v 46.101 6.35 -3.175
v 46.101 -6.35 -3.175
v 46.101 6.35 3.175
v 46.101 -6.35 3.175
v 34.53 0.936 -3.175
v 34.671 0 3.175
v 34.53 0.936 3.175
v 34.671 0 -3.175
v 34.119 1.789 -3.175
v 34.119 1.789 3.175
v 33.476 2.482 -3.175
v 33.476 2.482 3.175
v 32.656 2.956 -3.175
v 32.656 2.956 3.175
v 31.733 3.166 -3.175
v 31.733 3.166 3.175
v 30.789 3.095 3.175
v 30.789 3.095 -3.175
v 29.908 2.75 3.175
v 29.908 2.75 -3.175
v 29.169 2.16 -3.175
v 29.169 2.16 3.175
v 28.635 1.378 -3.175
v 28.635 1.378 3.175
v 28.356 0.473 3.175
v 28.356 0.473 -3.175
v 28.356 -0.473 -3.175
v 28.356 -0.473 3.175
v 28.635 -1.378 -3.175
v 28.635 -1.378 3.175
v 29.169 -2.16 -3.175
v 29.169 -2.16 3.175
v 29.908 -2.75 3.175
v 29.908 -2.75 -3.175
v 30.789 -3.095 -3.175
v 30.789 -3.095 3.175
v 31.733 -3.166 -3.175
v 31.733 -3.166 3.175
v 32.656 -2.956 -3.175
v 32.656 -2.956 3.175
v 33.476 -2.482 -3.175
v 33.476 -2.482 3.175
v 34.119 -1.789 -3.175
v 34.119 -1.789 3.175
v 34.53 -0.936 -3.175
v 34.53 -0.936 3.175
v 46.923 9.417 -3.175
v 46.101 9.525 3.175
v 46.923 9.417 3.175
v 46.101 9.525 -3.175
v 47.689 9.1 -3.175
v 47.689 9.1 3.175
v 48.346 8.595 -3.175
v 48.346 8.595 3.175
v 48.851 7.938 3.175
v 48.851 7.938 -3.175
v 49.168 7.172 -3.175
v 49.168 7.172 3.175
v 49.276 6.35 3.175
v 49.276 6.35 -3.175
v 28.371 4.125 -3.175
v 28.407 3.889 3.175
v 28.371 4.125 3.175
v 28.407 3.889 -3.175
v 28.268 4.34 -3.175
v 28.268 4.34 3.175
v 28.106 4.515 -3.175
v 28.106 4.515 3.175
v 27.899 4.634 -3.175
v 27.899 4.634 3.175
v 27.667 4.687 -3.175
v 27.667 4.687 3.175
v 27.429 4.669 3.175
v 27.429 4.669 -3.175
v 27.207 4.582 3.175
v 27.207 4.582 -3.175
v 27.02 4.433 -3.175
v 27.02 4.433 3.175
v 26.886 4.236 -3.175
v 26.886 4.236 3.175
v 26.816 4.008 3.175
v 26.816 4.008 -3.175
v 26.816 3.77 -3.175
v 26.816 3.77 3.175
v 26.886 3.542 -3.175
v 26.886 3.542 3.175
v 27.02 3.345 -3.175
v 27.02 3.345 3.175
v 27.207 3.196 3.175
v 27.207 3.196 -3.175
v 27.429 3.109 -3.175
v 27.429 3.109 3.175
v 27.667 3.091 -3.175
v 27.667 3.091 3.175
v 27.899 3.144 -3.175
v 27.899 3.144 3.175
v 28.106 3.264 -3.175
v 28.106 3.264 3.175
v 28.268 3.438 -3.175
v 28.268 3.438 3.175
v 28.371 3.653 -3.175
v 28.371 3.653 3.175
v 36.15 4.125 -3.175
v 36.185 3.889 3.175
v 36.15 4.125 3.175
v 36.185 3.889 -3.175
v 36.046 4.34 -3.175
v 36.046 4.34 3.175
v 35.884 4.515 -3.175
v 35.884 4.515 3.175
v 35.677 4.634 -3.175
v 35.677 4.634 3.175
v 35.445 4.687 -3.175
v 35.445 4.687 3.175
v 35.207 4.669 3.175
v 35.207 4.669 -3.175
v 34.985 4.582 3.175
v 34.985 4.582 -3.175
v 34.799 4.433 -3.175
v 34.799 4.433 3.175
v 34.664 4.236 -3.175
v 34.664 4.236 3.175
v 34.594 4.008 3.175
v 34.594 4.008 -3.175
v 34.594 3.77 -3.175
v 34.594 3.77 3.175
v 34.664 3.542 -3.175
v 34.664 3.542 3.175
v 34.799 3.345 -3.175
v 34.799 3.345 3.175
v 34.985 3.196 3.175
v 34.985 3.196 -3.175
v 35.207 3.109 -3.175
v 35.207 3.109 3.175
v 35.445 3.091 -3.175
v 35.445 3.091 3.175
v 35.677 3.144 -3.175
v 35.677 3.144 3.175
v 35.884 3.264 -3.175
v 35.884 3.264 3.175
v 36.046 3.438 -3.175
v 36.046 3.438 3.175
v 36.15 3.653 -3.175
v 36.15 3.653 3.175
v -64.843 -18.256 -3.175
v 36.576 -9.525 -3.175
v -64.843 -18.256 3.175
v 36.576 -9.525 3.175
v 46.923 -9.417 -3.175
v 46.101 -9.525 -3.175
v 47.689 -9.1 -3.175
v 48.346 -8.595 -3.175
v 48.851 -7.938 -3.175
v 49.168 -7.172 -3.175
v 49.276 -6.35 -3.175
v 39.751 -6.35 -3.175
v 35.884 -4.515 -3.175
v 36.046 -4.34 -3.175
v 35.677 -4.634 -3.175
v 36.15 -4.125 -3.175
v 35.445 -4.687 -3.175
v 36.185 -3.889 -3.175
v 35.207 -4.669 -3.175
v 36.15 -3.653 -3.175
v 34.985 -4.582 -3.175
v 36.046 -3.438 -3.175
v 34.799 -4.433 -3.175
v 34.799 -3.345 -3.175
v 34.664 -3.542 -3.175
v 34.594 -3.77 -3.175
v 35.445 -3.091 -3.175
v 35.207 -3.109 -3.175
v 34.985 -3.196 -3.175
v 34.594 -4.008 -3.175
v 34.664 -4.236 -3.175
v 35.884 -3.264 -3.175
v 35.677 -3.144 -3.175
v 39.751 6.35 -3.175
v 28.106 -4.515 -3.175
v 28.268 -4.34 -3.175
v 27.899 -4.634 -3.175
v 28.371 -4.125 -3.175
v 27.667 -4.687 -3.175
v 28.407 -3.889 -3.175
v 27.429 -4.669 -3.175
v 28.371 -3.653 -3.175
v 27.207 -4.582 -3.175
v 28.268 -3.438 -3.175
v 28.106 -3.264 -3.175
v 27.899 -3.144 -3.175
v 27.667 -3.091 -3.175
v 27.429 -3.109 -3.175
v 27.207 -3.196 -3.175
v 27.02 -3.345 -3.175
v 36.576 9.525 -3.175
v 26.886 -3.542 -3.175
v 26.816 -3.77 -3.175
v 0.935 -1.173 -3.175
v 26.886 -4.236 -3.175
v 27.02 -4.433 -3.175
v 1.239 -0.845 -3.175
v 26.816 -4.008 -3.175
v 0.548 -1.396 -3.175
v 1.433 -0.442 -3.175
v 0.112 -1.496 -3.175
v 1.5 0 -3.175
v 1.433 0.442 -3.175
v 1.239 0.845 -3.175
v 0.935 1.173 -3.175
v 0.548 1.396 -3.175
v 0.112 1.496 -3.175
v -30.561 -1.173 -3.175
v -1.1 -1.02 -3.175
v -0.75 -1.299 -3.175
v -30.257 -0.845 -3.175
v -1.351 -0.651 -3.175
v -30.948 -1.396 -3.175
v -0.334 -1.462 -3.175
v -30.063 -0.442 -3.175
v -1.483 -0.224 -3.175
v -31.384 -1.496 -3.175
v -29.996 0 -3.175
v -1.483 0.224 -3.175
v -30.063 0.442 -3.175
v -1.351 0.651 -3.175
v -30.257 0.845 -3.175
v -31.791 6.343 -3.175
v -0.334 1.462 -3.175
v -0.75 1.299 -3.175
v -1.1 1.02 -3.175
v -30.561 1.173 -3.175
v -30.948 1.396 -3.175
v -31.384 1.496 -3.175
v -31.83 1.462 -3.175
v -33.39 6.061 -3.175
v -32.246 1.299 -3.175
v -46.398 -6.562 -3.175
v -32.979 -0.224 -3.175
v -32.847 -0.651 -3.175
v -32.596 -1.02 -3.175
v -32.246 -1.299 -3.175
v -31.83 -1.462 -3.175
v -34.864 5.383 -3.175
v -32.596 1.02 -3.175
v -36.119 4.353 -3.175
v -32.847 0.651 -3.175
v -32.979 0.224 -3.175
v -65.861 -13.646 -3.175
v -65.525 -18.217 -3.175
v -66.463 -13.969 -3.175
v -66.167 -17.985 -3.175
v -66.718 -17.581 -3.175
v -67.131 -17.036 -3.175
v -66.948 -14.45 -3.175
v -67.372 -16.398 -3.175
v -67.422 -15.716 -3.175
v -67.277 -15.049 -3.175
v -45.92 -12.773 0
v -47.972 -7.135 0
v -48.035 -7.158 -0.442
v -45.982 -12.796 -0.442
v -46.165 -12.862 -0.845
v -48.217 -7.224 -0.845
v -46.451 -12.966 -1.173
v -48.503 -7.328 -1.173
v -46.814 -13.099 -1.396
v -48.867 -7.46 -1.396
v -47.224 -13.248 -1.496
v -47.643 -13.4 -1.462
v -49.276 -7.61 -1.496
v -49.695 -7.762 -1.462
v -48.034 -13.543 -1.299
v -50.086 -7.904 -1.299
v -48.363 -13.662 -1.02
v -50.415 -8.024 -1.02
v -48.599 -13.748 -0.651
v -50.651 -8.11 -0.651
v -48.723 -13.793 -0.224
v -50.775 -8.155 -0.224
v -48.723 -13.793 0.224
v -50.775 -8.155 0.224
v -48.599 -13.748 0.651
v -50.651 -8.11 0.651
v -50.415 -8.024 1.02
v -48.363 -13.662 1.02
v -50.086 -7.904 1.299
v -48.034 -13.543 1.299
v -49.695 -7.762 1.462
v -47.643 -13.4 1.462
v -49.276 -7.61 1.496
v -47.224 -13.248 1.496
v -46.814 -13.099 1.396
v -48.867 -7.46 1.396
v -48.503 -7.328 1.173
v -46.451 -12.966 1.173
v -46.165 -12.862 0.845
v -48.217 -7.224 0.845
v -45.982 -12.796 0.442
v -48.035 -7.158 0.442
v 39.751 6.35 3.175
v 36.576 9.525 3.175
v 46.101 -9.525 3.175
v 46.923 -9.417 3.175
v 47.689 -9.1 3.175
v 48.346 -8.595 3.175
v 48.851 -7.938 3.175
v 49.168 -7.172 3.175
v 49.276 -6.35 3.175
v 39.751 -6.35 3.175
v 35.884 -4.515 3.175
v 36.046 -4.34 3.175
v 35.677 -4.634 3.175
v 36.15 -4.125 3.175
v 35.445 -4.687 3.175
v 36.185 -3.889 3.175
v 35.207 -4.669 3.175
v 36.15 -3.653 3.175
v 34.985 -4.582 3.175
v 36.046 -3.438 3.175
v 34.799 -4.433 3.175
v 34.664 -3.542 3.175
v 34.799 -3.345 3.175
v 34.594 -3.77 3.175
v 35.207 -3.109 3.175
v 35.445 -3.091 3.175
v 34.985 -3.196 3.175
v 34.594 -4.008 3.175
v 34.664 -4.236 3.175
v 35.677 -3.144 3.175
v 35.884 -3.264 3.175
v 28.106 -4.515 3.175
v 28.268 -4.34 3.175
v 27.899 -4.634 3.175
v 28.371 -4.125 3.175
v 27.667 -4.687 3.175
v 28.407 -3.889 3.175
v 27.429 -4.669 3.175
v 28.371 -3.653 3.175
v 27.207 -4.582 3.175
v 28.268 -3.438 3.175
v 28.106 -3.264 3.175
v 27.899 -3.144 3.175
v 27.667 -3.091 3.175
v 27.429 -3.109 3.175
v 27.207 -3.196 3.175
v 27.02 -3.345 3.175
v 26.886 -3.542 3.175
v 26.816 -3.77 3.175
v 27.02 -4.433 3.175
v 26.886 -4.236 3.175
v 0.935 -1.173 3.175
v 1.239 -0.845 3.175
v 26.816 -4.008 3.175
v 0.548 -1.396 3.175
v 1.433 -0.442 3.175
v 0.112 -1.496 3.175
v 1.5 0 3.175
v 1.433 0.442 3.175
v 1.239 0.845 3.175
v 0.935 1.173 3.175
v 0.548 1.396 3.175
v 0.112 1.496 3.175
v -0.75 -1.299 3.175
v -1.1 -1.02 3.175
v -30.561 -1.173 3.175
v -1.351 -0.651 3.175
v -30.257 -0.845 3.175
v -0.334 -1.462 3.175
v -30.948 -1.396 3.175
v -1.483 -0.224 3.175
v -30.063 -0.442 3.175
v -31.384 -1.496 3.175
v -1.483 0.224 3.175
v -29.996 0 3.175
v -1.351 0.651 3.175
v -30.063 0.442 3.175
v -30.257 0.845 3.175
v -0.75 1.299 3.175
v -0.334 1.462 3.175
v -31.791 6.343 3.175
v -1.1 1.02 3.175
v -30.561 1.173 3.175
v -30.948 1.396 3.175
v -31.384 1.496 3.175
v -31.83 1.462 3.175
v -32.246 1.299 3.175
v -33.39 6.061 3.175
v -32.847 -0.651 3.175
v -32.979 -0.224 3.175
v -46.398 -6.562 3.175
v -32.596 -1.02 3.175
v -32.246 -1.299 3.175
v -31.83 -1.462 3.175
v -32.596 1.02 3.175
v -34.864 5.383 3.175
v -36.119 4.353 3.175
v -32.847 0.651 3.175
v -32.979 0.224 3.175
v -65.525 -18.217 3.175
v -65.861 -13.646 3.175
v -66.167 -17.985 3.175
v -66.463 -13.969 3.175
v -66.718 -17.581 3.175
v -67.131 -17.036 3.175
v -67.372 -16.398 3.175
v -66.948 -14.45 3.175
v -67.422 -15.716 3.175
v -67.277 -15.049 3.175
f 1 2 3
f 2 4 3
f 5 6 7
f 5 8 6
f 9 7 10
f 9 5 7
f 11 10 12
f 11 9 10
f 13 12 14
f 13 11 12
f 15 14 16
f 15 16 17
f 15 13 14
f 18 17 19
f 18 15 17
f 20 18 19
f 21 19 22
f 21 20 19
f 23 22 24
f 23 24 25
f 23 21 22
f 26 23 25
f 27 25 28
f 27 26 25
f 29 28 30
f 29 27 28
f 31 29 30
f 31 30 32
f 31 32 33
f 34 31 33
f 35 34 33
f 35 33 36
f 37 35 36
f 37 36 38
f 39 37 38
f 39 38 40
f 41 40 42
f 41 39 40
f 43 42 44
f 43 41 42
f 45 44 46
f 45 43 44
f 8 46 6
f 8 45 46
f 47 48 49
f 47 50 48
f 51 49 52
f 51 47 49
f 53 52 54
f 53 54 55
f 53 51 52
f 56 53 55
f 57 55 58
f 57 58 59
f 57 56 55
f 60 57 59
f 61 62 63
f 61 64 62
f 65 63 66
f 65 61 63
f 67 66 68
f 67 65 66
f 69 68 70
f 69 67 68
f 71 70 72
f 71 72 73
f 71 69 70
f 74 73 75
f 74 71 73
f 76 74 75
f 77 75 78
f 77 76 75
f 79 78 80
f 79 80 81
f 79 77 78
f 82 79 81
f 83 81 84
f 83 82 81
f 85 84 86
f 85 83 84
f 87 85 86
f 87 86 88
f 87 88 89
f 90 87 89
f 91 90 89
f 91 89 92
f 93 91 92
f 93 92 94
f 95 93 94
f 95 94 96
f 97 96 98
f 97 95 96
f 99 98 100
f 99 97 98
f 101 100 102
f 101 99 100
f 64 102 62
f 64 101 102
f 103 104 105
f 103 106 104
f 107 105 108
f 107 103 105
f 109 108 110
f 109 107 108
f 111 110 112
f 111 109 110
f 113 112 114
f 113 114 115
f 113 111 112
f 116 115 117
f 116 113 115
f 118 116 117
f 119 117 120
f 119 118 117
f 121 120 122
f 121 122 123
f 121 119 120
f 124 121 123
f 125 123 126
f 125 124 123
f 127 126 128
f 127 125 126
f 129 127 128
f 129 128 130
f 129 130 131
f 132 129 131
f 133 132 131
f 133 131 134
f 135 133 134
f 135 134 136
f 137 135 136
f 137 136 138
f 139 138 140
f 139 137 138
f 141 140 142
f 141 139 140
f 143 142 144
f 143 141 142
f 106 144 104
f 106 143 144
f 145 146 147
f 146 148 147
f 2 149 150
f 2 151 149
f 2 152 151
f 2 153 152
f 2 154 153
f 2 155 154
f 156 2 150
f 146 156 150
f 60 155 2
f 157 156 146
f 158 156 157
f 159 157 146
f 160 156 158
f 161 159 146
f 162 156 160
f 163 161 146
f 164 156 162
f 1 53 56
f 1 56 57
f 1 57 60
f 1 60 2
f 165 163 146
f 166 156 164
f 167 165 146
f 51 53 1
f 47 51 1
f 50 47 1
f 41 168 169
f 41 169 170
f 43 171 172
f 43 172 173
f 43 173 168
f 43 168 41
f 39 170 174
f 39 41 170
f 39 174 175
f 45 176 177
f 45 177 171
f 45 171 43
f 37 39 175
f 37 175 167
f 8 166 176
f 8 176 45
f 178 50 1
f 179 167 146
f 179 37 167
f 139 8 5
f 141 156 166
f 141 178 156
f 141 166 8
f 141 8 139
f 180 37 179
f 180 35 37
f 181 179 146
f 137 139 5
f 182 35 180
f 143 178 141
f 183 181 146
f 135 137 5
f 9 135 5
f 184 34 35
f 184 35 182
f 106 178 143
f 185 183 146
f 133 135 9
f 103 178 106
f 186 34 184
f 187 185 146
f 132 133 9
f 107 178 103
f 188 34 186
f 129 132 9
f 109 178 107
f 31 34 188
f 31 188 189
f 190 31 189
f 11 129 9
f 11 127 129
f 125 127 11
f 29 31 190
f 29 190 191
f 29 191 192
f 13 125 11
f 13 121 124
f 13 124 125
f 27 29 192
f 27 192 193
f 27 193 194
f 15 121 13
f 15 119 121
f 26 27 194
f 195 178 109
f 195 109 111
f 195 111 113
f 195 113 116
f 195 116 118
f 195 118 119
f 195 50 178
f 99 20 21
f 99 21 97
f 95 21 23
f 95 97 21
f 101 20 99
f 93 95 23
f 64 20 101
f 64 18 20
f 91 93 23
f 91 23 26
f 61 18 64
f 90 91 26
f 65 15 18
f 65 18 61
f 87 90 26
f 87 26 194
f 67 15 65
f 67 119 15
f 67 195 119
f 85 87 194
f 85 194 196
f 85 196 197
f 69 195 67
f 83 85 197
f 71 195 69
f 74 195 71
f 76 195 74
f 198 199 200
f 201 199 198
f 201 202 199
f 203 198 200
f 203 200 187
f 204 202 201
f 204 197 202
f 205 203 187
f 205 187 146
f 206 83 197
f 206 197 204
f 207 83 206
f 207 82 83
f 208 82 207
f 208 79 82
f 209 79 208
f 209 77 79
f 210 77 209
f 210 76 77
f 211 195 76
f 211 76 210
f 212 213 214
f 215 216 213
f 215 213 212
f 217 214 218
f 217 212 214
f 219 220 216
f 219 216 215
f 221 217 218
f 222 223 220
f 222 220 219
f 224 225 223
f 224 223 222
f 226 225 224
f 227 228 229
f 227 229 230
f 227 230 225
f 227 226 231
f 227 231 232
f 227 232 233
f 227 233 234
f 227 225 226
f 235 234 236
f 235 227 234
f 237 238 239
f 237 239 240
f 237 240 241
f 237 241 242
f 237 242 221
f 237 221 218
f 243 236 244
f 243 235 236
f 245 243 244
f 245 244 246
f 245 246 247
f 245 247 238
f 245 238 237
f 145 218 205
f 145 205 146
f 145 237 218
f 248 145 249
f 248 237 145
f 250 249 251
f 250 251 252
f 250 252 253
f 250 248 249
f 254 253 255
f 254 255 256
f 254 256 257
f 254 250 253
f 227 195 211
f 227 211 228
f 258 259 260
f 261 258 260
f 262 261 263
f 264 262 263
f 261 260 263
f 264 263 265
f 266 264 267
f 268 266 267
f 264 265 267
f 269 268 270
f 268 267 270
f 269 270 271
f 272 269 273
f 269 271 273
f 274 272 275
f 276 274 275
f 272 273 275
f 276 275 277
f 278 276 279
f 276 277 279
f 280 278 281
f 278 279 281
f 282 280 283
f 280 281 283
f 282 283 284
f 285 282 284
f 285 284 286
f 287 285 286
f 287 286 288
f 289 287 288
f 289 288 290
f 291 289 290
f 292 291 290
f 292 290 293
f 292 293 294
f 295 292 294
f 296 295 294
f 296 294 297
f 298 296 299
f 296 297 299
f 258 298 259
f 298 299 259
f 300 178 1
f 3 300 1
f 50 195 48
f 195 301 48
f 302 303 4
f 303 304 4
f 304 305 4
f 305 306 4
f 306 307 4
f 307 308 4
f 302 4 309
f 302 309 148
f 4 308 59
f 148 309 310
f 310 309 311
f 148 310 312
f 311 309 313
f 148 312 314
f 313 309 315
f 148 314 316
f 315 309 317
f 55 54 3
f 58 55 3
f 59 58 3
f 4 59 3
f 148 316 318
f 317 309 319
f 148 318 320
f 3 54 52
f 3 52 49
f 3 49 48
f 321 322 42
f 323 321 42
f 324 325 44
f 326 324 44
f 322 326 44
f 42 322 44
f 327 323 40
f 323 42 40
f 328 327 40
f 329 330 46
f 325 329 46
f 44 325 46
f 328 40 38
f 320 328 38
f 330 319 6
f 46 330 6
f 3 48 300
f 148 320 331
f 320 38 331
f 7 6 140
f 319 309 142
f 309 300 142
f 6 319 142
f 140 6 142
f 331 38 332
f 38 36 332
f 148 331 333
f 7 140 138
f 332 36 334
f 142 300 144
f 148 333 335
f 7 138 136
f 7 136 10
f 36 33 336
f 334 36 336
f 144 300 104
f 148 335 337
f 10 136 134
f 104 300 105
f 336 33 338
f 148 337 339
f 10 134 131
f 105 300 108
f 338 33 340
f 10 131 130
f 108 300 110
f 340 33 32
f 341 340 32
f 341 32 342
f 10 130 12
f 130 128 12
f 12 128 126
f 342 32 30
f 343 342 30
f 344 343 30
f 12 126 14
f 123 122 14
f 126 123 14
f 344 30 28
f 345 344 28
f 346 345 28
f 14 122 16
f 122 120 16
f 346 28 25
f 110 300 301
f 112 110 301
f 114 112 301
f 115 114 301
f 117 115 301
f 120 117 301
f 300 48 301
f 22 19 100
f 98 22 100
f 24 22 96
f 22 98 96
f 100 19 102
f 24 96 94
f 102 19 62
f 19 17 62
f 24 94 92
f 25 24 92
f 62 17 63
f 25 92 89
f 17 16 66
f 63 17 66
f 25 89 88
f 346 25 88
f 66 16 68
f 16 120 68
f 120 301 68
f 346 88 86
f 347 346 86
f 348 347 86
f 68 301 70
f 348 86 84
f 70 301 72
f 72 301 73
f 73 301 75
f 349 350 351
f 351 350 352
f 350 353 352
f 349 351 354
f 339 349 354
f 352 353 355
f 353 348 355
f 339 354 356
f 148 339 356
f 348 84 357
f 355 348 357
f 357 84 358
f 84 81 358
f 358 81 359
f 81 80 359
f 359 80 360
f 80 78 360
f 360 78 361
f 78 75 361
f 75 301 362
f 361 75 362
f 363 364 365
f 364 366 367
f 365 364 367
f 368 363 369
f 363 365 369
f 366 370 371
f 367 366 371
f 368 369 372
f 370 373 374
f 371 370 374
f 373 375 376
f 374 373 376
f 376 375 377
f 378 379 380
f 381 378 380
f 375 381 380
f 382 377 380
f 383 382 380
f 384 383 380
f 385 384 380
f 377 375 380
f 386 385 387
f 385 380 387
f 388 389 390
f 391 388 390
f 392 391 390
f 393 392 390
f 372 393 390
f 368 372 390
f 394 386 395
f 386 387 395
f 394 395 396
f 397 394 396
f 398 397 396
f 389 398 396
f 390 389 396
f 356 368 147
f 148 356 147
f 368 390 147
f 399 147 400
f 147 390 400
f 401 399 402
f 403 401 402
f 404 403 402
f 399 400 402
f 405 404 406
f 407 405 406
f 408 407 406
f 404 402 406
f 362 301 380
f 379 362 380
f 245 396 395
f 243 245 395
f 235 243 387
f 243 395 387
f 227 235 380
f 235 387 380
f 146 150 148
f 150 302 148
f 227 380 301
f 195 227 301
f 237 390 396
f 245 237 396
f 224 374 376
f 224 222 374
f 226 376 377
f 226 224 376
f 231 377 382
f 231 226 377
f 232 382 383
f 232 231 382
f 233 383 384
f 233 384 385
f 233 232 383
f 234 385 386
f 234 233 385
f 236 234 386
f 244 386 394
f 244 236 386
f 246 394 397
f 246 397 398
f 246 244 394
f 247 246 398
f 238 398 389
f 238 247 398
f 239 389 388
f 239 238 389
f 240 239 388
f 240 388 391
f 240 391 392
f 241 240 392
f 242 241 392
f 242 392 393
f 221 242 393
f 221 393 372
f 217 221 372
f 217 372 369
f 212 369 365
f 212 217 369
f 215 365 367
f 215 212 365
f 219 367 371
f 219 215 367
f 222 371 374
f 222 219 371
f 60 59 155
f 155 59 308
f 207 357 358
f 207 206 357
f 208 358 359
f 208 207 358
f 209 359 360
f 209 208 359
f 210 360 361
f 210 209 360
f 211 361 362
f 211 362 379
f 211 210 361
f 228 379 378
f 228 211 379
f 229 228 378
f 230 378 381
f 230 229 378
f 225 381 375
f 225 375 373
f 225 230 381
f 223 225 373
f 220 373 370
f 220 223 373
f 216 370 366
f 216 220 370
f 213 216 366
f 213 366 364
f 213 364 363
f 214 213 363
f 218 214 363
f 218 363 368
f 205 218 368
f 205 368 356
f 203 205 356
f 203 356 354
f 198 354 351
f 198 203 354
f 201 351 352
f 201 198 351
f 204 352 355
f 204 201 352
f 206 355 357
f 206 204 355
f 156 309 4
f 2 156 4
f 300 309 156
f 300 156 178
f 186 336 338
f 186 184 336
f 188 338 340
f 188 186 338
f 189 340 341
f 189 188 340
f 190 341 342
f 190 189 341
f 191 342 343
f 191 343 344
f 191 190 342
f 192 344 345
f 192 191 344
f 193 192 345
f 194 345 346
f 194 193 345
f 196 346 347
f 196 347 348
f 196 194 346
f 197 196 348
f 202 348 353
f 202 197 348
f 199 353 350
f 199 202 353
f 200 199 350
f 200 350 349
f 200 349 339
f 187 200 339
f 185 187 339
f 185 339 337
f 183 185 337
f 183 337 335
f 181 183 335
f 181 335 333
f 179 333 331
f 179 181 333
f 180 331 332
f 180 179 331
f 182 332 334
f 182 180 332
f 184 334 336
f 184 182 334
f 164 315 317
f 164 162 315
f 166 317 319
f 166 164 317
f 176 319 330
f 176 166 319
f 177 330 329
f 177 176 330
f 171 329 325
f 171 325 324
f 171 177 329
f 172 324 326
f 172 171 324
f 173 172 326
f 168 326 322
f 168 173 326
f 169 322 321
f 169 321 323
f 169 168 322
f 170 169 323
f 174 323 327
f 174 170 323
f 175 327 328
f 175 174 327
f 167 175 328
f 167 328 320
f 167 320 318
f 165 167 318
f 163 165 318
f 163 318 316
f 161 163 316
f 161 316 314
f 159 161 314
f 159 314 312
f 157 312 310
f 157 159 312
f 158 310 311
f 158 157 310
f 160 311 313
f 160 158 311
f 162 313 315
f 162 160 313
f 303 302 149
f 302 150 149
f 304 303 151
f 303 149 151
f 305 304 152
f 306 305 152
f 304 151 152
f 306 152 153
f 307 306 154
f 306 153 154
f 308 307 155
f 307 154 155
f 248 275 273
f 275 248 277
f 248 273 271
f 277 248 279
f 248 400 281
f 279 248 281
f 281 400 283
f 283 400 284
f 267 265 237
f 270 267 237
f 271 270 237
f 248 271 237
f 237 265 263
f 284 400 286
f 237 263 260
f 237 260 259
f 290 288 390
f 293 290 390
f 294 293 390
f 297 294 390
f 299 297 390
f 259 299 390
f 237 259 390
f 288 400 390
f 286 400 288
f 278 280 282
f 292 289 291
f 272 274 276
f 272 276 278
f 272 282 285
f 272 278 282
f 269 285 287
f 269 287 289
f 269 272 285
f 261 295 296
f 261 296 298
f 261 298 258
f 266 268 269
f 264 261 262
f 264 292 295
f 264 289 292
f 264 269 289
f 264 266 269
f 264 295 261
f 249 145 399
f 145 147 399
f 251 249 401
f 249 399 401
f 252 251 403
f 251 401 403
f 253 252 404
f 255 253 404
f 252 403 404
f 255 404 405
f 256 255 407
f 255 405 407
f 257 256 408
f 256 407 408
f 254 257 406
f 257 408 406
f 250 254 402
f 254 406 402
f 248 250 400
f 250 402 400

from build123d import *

# Parameters (mm, degrees)
SKETCH1_R           = 3.175
SKETCH1_R_2         = 0.8
SKETCH1_R_3         = 1.499997
SKETCH1_W           = 6.35
SKETCH1_H           = 12.7
BOSS_EXTRUDE1_DEPTH = 3.175
FILLET1_R           = 3.175
SKETCH2_R           = 1.5
CUT_EXTRUDE1_DEPTH  = 6


with BuildPart() as part:
    # Sketch1 → Boss-Extrude1 (new body, symmetric)
    with BuildSketch(Plane.XY):
        with BuildLine():
            Line((36.576, 9.525), (49.276, 9.525))
            Line((49.276, 9.525), (49.276, -9.525))
            Line((49.276, -9.525), (36.576, -9.525))
            Line((36.576, -9.525), (-64.842812423, -18.25625))
            ThreePointArc((-64.842812423, -18.25625), (-67.372222956, -16.397560002), (-65.861496639, -13.646132709))
            Line((-65.861496639, -13.646132709), (-46.397973184, -6.561989517))
            Line((-46.397973184, -6.561989517), (-36.118832942, 4.353379789))
            ThreePointArc((-36.118832942, 4.353379789), (-34.148654973, 5.769395254), (-31.791214639, 6.343133951))
            Line((-31.791214639, 6.343133951), (36.576, 9.525))
        make_face()
        with Locations((31.496, 0)):
            Circle(SKETCH1_R, mode=Mode.SUBTRACT)
        with Locations((27.606912703, 3.889087297)):
            Circle(SKETCH1_R_2, mode=Mode.SUBTRACT)
        with Locations((35.385087297, -3.889087297)):
            Circle(SKETCH1_R_2, mode=Mode.SUBTRACT)
        with Locations((-31.496, 0)):
            Circle(SKETCH1_R_3, mode=Mode.SUBTRACT)
        with Locations((35.385087297, 3.889087297)):
            Circle(SKETCH1_R_2, mode=Mode.SUBTRACT)
        with Locations((27.606912703, -3.889087297)):
            Circle(SKETCH1_R_2, mode=Mode.SUBTRACT)
        Circle(SKETCH1_R_3, mode=Mode.SUBTRACT)
        with Locations((42.926, 0)):
            Rectangle(SKETCH1_W, SKETCH1_H, mode=Mode.SUBTRACT)
    extrude(amount=BOSS_EXTRUDE1_DEPTH, both=True)

    # Fillet1
    fillet1_edges = [part.edges().sort_by_distance(p)[0] for p in [
        (49.276, 9.525, 0),
        (49.276, -9.525, 0),
    ]]
    fillet(fillet1_edges, radius=FILLET1_R)

    # Sketch2 → Cut-Extrude1 (cut)
    with BuildSketch(Plane(origin=(-3.318549049, 9.117638577, 0), x_dir=(0.939692621, 0.342020143, 0), z_dir=(-0.342020143, 0.939692621, 0))):
        with Locations((-49.019165615, 0)):
            Circle(SKETCH2_R)
    extrude(amount=-CUT_EXTRUDE1_DEPTH, mode=Mode.SUBTRACT)


solid = part.part
